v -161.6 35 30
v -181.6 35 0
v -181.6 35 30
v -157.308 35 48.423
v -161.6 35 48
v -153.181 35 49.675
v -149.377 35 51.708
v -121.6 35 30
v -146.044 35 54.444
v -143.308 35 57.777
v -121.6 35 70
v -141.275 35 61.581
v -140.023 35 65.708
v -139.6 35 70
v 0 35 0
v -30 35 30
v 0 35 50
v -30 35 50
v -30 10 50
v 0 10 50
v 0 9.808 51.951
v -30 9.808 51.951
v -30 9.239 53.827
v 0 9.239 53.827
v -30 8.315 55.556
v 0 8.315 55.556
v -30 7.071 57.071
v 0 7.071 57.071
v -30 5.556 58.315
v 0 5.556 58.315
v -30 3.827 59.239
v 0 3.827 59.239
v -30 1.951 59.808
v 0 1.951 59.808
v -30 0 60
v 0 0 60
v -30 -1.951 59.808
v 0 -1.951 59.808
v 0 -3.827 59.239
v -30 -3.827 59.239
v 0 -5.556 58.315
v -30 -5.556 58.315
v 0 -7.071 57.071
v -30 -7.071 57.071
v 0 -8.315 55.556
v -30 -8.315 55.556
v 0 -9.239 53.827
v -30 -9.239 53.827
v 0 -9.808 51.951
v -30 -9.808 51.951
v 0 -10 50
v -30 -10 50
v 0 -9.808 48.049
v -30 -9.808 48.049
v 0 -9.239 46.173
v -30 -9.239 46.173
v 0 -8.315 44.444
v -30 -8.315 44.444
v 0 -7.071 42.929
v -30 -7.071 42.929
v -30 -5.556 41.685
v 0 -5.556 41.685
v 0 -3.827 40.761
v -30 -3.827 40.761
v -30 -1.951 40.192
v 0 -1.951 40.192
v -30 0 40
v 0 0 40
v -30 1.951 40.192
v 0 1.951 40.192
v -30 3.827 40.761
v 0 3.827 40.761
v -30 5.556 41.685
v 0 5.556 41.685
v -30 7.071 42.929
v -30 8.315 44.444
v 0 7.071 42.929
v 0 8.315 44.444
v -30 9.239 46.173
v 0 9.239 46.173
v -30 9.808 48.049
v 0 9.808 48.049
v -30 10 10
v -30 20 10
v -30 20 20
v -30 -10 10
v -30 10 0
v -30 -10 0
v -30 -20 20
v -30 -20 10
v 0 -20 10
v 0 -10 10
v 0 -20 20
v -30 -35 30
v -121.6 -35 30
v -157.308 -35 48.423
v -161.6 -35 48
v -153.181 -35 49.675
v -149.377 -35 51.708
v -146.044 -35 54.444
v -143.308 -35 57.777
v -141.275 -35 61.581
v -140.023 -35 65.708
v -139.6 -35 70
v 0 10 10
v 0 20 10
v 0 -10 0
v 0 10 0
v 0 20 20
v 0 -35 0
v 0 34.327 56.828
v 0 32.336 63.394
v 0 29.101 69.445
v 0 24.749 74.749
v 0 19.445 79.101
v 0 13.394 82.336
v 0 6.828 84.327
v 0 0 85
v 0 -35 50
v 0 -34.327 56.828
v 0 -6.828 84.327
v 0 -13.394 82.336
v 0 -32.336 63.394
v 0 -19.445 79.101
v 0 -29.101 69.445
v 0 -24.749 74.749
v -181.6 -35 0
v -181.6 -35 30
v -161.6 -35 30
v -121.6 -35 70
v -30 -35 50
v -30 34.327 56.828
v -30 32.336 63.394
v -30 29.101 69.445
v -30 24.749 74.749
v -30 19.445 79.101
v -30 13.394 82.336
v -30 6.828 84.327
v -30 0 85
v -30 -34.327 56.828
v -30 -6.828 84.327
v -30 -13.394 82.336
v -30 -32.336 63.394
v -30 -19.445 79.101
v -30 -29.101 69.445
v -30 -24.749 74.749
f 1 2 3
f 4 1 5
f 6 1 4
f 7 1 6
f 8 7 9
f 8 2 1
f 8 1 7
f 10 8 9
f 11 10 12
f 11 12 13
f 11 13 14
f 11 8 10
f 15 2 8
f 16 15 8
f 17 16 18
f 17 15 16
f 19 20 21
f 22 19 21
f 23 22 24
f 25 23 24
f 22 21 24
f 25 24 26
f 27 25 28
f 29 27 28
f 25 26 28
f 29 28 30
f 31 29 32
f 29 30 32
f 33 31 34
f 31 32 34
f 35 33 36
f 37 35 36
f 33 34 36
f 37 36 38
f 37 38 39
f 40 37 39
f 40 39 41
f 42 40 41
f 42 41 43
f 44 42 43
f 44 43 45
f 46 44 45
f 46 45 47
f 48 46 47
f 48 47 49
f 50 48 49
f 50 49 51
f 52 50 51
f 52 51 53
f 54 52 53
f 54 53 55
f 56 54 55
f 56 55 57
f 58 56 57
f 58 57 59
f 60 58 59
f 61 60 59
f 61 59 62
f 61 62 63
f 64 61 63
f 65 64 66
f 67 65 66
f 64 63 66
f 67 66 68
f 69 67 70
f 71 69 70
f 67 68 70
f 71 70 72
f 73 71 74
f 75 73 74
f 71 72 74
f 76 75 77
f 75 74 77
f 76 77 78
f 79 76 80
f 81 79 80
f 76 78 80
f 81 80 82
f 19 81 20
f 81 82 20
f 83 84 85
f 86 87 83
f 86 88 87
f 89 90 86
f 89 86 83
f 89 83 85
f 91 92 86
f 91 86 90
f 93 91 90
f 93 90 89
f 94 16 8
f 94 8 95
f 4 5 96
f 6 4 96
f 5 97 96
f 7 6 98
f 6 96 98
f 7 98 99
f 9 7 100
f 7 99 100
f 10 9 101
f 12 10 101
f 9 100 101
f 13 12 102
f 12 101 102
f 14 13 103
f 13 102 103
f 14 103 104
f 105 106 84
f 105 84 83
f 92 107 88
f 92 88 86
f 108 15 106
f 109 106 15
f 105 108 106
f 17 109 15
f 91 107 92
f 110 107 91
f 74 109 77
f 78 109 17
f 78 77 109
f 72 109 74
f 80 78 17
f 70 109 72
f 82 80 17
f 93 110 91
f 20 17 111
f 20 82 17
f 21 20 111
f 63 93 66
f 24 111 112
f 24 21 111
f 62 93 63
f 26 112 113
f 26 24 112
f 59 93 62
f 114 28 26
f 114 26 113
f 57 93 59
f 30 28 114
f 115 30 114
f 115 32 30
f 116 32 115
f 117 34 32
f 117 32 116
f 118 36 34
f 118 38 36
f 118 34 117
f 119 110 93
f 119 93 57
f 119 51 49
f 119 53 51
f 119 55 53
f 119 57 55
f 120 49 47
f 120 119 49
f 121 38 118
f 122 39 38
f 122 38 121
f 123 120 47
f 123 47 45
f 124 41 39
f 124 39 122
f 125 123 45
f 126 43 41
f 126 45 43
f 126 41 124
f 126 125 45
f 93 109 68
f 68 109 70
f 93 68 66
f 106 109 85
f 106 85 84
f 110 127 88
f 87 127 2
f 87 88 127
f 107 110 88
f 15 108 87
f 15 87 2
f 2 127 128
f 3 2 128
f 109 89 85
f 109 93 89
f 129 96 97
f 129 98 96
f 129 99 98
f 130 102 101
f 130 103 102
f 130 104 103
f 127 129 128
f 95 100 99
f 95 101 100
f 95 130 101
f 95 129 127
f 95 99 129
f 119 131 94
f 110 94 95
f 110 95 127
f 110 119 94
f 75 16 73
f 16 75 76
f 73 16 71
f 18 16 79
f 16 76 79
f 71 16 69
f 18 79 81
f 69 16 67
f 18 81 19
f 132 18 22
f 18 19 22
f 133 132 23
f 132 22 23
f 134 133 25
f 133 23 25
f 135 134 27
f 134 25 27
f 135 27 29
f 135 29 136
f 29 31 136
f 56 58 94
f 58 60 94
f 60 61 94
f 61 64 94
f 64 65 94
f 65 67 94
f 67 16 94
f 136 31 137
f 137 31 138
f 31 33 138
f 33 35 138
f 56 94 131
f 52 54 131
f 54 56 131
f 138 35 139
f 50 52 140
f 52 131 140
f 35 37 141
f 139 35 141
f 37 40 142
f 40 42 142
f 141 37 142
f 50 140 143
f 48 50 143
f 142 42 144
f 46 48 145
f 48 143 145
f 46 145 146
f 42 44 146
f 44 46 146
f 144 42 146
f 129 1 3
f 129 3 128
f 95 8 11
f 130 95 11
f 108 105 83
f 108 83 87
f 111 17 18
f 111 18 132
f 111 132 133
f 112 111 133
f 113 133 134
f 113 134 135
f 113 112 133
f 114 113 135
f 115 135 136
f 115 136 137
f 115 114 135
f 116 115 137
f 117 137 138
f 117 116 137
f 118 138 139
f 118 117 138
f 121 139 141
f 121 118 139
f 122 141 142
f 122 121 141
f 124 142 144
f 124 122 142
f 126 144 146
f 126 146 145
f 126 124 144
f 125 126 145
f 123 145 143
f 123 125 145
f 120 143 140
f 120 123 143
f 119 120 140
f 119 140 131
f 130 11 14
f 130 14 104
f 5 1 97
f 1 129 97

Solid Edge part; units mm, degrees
sketch "Sketch1" plane through (0, 0, 0) normal (1, 0, 0) x (0, 1, 0)
  arc A0 (35, 50) -> (-35, 50) centre (0, 50) ccw
  line L0 (-35, 50) -> (-35, 0)
  line L1 (-35, 0) -> (-10, 0)
  line L2 (-10, 0) -> (-10, 10)
  line L3 (-10, 10) -> (-20, 10)
  line L4 (-20, 10) -> (-20, 20)
  line L5 (-20, 20) -> (0, 20)
  line L6 (0, 20) -> (20, 20)
  line L7 (20, 20) -> (20, 10)
  line L8 (20, 10) -> (10, 10)
  line L9 (10, 10) -> (10, 0)
  line L10 (10, 0) -> (35, 0)
  line L11 (35, 0) -> (35, 50)
extrude "Protrusion1" add sketch "Sketch1" against normal blind 30
sketch "Sketch2" plane through (0, 0, 0) normal (1, 0, 0) x (0, 1, 0)
  circle A0 centre (0, 50) radius 10
extrude "ExtrudedCutout_1" cut sketch "Sketch2" against normal blind 30
sketch "Sketch3" plane through (-30, 0, 42.5) normal (1, 0, 0) x (0, 1, 0)
  line L0 (35, -12.5) -> (-35, -12.5)
  line L1 (-35, -12.5) -> (-35, -42.5)
  line L2 (-35, -42.5) -> (35, -42.5)
  line L3 (35, -42.5) -> (35, -12.5)
extrude "ExtrudedProtrusion_2" add sketch "Sketch3" against normal blind 91.6
sketch "Sketch4" plane through (-121.6, 0, 42.5) normal (1, 0, 0) x (0, 1, 0)
  line L0 (35, 27.5) -> (-35, 27.5)
  line L1 (-35, 27.5) -> (-35, -42.5)
  line L2 (-35, -42.5) -> (35, -42.5)
  line L3 (35, -42.5) -> (35, 27.5)
extrude "ExtrudedProtrusion_3" add sketch "Sketch4" against normal blind 40
sketch "Sketch5" plane through (-80.8, -35, 35) normal (0, -1, 0) x (1, 0, 0)
  circle A0 centre (-80.8, 35) radius 22
extrude "ExtrudedCutout_2" cut sketch "Sketch5" against normal blind 100
sketch "Sketch6" plane through (-121.6, 0, 42.5) normal (1, 0, 0) x (0, 1, 0)
  line L0 (35, -12.5) -> (-35, -12.5)
  line L1 (-35, -12.5) -> (-35, -42.5)
  line L2 (-35, -42.5) -> (35, -42.5)
  line L3 (35, -42.5) -> (35, -12.5)
extrude "ExtrudedProtrusion_4" add sketch "Sketch6" against normal blind 60
